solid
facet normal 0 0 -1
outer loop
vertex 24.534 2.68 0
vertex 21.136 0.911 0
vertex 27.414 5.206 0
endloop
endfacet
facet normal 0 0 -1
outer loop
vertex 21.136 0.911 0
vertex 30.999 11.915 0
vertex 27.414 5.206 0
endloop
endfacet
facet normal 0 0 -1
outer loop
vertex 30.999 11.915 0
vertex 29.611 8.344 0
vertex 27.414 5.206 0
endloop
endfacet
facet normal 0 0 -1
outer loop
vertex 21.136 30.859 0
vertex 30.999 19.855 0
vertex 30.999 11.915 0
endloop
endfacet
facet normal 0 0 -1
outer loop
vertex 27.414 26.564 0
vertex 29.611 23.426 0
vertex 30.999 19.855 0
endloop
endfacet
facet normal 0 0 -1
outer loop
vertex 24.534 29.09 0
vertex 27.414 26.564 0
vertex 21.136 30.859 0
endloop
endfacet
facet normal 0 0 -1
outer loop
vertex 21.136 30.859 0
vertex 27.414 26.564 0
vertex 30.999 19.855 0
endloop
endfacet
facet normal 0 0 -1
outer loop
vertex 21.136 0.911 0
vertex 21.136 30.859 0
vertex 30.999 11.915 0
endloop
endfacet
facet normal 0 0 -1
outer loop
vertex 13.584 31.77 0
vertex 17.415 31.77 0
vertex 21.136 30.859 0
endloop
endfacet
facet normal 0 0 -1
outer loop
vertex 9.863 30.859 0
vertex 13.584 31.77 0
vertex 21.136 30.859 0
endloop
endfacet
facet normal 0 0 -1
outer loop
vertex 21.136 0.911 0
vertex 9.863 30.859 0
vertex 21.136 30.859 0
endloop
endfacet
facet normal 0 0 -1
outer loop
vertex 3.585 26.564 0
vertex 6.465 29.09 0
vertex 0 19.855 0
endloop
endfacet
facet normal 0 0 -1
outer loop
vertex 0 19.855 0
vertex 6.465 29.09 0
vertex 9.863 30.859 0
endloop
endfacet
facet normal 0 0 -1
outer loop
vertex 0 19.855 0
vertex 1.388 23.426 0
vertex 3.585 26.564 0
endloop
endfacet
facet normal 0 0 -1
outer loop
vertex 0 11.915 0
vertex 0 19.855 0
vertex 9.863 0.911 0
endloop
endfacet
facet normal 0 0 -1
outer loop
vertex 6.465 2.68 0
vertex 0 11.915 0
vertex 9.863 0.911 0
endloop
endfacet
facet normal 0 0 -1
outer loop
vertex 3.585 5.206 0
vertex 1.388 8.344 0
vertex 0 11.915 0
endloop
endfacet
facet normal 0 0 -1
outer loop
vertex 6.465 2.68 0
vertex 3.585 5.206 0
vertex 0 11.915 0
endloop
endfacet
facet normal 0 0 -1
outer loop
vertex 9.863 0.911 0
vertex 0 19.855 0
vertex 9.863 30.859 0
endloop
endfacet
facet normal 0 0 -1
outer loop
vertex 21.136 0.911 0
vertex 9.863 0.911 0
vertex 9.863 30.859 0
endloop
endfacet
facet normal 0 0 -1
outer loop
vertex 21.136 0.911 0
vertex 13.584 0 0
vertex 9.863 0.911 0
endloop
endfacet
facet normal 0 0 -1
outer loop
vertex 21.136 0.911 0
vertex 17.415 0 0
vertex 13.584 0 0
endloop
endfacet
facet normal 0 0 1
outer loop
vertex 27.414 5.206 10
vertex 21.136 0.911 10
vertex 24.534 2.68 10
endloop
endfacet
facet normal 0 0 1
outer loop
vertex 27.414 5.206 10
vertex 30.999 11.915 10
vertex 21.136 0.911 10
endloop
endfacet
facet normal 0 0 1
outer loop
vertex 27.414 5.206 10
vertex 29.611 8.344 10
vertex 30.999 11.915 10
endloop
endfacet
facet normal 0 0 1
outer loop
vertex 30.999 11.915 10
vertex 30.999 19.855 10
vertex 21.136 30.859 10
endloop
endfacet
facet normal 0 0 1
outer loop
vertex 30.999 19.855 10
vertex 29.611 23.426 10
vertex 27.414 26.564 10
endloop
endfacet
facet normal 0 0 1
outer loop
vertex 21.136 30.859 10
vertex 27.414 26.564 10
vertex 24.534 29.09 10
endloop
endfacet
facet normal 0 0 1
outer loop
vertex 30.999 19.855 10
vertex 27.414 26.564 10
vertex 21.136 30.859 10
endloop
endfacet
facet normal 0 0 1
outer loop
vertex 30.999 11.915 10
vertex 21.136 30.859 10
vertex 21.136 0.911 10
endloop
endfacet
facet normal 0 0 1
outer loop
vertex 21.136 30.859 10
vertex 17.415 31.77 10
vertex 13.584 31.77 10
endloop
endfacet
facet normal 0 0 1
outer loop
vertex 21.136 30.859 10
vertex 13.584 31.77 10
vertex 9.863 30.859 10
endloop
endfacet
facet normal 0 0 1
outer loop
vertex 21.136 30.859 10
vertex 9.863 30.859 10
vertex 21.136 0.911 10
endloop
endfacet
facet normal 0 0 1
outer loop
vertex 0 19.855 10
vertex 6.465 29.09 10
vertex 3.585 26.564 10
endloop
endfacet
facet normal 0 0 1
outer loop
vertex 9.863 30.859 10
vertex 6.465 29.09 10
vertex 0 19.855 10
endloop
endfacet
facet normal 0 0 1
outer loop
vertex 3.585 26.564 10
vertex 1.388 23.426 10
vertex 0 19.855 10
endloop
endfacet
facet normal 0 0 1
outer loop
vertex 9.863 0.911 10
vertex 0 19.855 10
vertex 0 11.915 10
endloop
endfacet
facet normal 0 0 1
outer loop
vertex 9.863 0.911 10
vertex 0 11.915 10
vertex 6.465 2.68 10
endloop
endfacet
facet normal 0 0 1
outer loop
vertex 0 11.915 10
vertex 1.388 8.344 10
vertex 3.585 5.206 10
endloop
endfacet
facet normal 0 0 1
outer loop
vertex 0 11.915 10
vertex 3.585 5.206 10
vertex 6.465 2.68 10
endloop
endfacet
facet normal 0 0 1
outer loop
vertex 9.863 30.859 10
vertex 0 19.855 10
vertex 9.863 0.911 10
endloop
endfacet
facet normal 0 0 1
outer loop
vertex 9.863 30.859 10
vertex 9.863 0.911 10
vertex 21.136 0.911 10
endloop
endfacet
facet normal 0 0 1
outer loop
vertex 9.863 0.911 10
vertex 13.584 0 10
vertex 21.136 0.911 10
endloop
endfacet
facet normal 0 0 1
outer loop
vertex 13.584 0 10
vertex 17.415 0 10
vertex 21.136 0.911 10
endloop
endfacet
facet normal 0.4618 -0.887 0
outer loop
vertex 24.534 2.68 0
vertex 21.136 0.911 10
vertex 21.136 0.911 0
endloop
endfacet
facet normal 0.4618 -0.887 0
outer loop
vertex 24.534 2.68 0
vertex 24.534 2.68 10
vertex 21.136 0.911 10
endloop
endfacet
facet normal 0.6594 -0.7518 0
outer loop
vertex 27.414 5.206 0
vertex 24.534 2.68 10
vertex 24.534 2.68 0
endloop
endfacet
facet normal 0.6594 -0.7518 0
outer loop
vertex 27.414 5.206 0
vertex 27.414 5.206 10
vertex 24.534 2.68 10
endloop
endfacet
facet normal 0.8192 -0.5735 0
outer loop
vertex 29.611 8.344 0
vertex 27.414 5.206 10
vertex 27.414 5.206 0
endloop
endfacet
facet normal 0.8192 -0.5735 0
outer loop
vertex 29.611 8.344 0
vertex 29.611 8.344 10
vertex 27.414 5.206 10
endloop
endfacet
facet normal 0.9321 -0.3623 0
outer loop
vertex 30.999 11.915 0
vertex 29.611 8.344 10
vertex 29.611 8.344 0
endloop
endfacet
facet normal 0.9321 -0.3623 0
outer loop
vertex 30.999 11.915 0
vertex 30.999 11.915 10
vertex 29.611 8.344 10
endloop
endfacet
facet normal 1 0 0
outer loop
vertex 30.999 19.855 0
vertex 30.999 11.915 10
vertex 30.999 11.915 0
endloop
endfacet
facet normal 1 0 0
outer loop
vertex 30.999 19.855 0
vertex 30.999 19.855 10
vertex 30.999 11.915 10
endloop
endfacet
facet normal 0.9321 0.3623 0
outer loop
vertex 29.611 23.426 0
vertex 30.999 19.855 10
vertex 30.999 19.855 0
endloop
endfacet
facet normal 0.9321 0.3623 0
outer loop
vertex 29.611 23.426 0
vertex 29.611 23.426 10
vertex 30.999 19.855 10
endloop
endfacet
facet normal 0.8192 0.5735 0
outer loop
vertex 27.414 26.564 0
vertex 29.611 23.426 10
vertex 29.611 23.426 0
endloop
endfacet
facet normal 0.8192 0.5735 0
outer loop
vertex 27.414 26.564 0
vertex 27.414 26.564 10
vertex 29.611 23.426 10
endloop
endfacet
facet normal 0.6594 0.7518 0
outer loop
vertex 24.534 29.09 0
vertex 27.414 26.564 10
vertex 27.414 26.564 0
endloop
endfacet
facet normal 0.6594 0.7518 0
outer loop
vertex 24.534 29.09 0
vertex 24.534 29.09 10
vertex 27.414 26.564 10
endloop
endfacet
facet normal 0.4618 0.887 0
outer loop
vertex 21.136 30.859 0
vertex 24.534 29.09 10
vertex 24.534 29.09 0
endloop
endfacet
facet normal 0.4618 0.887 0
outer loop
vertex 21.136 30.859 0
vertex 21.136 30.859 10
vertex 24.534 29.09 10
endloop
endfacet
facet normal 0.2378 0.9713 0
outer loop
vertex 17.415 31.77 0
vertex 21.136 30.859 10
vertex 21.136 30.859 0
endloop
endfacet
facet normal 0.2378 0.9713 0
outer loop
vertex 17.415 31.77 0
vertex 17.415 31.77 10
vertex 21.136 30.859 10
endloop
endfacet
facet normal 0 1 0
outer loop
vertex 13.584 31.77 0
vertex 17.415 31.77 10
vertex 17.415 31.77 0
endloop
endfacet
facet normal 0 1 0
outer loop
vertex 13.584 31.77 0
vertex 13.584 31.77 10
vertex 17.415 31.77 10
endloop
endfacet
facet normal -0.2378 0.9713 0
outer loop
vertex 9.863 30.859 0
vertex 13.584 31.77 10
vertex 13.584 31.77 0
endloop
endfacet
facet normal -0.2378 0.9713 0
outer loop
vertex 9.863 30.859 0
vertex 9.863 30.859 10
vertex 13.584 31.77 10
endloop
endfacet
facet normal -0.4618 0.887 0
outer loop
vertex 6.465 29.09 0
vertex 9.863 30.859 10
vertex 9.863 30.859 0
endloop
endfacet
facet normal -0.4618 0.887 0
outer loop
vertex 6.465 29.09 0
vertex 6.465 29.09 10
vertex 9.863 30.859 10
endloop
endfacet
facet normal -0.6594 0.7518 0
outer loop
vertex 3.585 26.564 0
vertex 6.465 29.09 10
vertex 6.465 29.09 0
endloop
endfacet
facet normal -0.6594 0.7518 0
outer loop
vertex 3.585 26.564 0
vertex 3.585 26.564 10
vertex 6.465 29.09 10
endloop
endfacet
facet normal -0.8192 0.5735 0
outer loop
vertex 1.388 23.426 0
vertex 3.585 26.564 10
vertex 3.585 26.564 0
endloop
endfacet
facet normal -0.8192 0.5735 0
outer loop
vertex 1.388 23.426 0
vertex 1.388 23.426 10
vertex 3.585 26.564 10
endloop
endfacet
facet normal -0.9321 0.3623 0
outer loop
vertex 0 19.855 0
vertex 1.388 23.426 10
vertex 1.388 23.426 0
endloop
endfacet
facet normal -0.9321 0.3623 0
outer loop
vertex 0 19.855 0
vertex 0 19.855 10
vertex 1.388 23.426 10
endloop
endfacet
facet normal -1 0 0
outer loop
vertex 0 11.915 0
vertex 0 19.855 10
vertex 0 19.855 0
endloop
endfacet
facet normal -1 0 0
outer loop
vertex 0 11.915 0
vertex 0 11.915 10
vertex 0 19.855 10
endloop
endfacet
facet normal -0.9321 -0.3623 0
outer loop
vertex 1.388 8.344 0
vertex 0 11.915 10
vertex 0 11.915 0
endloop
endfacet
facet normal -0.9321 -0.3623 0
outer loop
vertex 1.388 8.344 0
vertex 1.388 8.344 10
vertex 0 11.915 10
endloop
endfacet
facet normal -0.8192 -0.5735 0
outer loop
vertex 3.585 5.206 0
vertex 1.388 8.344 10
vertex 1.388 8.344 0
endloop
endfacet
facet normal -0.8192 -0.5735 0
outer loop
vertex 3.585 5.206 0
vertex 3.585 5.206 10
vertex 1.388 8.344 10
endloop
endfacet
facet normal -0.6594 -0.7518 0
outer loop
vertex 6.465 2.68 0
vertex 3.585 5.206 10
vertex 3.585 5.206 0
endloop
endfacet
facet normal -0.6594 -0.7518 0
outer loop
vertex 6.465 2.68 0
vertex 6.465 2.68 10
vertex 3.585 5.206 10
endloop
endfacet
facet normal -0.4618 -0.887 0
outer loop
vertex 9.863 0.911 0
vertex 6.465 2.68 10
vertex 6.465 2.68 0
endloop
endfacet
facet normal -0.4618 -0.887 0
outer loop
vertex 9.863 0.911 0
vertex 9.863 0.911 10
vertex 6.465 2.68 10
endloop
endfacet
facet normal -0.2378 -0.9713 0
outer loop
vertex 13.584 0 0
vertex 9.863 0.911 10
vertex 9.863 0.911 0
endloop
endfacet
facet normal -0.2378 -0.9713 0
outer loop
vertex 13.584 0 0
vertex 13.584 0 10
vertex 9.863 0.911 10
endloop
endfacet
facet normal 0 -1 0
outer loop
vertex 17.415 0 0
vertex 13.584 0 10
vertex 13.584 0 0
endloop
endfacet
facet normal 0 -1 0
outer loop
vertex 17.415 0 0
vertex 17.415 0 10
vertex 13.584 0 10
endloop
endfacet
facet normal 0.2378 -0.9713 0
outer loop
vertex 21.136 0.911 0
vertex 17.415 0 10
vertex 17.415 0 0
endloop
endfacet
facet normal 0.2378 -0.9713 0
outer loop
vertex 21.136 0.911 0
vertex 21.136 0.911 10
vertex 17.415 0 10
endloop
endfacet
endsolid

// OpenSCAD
$fn = 32;

// ----------------------------------------------------------------------
// Flat adaptor: double_d, 10 mm thick
// ----------------------------------------------------------------------

// --- parameters (mm) ---
profile_height = 10;      // extrusion height
profile_points = 24;      // points of the closed outline

profile = [[30.999, 19.855], [29.611, 23.426], [27.414, 26.564], [24.534, 29.09], [21.136, 30.859], [17.415, 31.77], [13.584, 31.77], [9.863, 30.859], [6.465, 29.09], [3.585, 26.564], [1.388, 23.426], [0, 19.855], [0, 11.915], [1.388, 8.344], [3.585, 5.206], [6.465, 2.68], [9.863, 0.911], [13.584, 0], [17.415, 0], [21.136, 0.911], [24.534, 2.68], [27.414, 5.206], [29.611, 8.344], [30.999, 11.915]];  // single closed polygon, 24 points, counter clockwise

// --- the one profile operation ---
linear_extrude(height = profile_height) polygon(points = profile);
